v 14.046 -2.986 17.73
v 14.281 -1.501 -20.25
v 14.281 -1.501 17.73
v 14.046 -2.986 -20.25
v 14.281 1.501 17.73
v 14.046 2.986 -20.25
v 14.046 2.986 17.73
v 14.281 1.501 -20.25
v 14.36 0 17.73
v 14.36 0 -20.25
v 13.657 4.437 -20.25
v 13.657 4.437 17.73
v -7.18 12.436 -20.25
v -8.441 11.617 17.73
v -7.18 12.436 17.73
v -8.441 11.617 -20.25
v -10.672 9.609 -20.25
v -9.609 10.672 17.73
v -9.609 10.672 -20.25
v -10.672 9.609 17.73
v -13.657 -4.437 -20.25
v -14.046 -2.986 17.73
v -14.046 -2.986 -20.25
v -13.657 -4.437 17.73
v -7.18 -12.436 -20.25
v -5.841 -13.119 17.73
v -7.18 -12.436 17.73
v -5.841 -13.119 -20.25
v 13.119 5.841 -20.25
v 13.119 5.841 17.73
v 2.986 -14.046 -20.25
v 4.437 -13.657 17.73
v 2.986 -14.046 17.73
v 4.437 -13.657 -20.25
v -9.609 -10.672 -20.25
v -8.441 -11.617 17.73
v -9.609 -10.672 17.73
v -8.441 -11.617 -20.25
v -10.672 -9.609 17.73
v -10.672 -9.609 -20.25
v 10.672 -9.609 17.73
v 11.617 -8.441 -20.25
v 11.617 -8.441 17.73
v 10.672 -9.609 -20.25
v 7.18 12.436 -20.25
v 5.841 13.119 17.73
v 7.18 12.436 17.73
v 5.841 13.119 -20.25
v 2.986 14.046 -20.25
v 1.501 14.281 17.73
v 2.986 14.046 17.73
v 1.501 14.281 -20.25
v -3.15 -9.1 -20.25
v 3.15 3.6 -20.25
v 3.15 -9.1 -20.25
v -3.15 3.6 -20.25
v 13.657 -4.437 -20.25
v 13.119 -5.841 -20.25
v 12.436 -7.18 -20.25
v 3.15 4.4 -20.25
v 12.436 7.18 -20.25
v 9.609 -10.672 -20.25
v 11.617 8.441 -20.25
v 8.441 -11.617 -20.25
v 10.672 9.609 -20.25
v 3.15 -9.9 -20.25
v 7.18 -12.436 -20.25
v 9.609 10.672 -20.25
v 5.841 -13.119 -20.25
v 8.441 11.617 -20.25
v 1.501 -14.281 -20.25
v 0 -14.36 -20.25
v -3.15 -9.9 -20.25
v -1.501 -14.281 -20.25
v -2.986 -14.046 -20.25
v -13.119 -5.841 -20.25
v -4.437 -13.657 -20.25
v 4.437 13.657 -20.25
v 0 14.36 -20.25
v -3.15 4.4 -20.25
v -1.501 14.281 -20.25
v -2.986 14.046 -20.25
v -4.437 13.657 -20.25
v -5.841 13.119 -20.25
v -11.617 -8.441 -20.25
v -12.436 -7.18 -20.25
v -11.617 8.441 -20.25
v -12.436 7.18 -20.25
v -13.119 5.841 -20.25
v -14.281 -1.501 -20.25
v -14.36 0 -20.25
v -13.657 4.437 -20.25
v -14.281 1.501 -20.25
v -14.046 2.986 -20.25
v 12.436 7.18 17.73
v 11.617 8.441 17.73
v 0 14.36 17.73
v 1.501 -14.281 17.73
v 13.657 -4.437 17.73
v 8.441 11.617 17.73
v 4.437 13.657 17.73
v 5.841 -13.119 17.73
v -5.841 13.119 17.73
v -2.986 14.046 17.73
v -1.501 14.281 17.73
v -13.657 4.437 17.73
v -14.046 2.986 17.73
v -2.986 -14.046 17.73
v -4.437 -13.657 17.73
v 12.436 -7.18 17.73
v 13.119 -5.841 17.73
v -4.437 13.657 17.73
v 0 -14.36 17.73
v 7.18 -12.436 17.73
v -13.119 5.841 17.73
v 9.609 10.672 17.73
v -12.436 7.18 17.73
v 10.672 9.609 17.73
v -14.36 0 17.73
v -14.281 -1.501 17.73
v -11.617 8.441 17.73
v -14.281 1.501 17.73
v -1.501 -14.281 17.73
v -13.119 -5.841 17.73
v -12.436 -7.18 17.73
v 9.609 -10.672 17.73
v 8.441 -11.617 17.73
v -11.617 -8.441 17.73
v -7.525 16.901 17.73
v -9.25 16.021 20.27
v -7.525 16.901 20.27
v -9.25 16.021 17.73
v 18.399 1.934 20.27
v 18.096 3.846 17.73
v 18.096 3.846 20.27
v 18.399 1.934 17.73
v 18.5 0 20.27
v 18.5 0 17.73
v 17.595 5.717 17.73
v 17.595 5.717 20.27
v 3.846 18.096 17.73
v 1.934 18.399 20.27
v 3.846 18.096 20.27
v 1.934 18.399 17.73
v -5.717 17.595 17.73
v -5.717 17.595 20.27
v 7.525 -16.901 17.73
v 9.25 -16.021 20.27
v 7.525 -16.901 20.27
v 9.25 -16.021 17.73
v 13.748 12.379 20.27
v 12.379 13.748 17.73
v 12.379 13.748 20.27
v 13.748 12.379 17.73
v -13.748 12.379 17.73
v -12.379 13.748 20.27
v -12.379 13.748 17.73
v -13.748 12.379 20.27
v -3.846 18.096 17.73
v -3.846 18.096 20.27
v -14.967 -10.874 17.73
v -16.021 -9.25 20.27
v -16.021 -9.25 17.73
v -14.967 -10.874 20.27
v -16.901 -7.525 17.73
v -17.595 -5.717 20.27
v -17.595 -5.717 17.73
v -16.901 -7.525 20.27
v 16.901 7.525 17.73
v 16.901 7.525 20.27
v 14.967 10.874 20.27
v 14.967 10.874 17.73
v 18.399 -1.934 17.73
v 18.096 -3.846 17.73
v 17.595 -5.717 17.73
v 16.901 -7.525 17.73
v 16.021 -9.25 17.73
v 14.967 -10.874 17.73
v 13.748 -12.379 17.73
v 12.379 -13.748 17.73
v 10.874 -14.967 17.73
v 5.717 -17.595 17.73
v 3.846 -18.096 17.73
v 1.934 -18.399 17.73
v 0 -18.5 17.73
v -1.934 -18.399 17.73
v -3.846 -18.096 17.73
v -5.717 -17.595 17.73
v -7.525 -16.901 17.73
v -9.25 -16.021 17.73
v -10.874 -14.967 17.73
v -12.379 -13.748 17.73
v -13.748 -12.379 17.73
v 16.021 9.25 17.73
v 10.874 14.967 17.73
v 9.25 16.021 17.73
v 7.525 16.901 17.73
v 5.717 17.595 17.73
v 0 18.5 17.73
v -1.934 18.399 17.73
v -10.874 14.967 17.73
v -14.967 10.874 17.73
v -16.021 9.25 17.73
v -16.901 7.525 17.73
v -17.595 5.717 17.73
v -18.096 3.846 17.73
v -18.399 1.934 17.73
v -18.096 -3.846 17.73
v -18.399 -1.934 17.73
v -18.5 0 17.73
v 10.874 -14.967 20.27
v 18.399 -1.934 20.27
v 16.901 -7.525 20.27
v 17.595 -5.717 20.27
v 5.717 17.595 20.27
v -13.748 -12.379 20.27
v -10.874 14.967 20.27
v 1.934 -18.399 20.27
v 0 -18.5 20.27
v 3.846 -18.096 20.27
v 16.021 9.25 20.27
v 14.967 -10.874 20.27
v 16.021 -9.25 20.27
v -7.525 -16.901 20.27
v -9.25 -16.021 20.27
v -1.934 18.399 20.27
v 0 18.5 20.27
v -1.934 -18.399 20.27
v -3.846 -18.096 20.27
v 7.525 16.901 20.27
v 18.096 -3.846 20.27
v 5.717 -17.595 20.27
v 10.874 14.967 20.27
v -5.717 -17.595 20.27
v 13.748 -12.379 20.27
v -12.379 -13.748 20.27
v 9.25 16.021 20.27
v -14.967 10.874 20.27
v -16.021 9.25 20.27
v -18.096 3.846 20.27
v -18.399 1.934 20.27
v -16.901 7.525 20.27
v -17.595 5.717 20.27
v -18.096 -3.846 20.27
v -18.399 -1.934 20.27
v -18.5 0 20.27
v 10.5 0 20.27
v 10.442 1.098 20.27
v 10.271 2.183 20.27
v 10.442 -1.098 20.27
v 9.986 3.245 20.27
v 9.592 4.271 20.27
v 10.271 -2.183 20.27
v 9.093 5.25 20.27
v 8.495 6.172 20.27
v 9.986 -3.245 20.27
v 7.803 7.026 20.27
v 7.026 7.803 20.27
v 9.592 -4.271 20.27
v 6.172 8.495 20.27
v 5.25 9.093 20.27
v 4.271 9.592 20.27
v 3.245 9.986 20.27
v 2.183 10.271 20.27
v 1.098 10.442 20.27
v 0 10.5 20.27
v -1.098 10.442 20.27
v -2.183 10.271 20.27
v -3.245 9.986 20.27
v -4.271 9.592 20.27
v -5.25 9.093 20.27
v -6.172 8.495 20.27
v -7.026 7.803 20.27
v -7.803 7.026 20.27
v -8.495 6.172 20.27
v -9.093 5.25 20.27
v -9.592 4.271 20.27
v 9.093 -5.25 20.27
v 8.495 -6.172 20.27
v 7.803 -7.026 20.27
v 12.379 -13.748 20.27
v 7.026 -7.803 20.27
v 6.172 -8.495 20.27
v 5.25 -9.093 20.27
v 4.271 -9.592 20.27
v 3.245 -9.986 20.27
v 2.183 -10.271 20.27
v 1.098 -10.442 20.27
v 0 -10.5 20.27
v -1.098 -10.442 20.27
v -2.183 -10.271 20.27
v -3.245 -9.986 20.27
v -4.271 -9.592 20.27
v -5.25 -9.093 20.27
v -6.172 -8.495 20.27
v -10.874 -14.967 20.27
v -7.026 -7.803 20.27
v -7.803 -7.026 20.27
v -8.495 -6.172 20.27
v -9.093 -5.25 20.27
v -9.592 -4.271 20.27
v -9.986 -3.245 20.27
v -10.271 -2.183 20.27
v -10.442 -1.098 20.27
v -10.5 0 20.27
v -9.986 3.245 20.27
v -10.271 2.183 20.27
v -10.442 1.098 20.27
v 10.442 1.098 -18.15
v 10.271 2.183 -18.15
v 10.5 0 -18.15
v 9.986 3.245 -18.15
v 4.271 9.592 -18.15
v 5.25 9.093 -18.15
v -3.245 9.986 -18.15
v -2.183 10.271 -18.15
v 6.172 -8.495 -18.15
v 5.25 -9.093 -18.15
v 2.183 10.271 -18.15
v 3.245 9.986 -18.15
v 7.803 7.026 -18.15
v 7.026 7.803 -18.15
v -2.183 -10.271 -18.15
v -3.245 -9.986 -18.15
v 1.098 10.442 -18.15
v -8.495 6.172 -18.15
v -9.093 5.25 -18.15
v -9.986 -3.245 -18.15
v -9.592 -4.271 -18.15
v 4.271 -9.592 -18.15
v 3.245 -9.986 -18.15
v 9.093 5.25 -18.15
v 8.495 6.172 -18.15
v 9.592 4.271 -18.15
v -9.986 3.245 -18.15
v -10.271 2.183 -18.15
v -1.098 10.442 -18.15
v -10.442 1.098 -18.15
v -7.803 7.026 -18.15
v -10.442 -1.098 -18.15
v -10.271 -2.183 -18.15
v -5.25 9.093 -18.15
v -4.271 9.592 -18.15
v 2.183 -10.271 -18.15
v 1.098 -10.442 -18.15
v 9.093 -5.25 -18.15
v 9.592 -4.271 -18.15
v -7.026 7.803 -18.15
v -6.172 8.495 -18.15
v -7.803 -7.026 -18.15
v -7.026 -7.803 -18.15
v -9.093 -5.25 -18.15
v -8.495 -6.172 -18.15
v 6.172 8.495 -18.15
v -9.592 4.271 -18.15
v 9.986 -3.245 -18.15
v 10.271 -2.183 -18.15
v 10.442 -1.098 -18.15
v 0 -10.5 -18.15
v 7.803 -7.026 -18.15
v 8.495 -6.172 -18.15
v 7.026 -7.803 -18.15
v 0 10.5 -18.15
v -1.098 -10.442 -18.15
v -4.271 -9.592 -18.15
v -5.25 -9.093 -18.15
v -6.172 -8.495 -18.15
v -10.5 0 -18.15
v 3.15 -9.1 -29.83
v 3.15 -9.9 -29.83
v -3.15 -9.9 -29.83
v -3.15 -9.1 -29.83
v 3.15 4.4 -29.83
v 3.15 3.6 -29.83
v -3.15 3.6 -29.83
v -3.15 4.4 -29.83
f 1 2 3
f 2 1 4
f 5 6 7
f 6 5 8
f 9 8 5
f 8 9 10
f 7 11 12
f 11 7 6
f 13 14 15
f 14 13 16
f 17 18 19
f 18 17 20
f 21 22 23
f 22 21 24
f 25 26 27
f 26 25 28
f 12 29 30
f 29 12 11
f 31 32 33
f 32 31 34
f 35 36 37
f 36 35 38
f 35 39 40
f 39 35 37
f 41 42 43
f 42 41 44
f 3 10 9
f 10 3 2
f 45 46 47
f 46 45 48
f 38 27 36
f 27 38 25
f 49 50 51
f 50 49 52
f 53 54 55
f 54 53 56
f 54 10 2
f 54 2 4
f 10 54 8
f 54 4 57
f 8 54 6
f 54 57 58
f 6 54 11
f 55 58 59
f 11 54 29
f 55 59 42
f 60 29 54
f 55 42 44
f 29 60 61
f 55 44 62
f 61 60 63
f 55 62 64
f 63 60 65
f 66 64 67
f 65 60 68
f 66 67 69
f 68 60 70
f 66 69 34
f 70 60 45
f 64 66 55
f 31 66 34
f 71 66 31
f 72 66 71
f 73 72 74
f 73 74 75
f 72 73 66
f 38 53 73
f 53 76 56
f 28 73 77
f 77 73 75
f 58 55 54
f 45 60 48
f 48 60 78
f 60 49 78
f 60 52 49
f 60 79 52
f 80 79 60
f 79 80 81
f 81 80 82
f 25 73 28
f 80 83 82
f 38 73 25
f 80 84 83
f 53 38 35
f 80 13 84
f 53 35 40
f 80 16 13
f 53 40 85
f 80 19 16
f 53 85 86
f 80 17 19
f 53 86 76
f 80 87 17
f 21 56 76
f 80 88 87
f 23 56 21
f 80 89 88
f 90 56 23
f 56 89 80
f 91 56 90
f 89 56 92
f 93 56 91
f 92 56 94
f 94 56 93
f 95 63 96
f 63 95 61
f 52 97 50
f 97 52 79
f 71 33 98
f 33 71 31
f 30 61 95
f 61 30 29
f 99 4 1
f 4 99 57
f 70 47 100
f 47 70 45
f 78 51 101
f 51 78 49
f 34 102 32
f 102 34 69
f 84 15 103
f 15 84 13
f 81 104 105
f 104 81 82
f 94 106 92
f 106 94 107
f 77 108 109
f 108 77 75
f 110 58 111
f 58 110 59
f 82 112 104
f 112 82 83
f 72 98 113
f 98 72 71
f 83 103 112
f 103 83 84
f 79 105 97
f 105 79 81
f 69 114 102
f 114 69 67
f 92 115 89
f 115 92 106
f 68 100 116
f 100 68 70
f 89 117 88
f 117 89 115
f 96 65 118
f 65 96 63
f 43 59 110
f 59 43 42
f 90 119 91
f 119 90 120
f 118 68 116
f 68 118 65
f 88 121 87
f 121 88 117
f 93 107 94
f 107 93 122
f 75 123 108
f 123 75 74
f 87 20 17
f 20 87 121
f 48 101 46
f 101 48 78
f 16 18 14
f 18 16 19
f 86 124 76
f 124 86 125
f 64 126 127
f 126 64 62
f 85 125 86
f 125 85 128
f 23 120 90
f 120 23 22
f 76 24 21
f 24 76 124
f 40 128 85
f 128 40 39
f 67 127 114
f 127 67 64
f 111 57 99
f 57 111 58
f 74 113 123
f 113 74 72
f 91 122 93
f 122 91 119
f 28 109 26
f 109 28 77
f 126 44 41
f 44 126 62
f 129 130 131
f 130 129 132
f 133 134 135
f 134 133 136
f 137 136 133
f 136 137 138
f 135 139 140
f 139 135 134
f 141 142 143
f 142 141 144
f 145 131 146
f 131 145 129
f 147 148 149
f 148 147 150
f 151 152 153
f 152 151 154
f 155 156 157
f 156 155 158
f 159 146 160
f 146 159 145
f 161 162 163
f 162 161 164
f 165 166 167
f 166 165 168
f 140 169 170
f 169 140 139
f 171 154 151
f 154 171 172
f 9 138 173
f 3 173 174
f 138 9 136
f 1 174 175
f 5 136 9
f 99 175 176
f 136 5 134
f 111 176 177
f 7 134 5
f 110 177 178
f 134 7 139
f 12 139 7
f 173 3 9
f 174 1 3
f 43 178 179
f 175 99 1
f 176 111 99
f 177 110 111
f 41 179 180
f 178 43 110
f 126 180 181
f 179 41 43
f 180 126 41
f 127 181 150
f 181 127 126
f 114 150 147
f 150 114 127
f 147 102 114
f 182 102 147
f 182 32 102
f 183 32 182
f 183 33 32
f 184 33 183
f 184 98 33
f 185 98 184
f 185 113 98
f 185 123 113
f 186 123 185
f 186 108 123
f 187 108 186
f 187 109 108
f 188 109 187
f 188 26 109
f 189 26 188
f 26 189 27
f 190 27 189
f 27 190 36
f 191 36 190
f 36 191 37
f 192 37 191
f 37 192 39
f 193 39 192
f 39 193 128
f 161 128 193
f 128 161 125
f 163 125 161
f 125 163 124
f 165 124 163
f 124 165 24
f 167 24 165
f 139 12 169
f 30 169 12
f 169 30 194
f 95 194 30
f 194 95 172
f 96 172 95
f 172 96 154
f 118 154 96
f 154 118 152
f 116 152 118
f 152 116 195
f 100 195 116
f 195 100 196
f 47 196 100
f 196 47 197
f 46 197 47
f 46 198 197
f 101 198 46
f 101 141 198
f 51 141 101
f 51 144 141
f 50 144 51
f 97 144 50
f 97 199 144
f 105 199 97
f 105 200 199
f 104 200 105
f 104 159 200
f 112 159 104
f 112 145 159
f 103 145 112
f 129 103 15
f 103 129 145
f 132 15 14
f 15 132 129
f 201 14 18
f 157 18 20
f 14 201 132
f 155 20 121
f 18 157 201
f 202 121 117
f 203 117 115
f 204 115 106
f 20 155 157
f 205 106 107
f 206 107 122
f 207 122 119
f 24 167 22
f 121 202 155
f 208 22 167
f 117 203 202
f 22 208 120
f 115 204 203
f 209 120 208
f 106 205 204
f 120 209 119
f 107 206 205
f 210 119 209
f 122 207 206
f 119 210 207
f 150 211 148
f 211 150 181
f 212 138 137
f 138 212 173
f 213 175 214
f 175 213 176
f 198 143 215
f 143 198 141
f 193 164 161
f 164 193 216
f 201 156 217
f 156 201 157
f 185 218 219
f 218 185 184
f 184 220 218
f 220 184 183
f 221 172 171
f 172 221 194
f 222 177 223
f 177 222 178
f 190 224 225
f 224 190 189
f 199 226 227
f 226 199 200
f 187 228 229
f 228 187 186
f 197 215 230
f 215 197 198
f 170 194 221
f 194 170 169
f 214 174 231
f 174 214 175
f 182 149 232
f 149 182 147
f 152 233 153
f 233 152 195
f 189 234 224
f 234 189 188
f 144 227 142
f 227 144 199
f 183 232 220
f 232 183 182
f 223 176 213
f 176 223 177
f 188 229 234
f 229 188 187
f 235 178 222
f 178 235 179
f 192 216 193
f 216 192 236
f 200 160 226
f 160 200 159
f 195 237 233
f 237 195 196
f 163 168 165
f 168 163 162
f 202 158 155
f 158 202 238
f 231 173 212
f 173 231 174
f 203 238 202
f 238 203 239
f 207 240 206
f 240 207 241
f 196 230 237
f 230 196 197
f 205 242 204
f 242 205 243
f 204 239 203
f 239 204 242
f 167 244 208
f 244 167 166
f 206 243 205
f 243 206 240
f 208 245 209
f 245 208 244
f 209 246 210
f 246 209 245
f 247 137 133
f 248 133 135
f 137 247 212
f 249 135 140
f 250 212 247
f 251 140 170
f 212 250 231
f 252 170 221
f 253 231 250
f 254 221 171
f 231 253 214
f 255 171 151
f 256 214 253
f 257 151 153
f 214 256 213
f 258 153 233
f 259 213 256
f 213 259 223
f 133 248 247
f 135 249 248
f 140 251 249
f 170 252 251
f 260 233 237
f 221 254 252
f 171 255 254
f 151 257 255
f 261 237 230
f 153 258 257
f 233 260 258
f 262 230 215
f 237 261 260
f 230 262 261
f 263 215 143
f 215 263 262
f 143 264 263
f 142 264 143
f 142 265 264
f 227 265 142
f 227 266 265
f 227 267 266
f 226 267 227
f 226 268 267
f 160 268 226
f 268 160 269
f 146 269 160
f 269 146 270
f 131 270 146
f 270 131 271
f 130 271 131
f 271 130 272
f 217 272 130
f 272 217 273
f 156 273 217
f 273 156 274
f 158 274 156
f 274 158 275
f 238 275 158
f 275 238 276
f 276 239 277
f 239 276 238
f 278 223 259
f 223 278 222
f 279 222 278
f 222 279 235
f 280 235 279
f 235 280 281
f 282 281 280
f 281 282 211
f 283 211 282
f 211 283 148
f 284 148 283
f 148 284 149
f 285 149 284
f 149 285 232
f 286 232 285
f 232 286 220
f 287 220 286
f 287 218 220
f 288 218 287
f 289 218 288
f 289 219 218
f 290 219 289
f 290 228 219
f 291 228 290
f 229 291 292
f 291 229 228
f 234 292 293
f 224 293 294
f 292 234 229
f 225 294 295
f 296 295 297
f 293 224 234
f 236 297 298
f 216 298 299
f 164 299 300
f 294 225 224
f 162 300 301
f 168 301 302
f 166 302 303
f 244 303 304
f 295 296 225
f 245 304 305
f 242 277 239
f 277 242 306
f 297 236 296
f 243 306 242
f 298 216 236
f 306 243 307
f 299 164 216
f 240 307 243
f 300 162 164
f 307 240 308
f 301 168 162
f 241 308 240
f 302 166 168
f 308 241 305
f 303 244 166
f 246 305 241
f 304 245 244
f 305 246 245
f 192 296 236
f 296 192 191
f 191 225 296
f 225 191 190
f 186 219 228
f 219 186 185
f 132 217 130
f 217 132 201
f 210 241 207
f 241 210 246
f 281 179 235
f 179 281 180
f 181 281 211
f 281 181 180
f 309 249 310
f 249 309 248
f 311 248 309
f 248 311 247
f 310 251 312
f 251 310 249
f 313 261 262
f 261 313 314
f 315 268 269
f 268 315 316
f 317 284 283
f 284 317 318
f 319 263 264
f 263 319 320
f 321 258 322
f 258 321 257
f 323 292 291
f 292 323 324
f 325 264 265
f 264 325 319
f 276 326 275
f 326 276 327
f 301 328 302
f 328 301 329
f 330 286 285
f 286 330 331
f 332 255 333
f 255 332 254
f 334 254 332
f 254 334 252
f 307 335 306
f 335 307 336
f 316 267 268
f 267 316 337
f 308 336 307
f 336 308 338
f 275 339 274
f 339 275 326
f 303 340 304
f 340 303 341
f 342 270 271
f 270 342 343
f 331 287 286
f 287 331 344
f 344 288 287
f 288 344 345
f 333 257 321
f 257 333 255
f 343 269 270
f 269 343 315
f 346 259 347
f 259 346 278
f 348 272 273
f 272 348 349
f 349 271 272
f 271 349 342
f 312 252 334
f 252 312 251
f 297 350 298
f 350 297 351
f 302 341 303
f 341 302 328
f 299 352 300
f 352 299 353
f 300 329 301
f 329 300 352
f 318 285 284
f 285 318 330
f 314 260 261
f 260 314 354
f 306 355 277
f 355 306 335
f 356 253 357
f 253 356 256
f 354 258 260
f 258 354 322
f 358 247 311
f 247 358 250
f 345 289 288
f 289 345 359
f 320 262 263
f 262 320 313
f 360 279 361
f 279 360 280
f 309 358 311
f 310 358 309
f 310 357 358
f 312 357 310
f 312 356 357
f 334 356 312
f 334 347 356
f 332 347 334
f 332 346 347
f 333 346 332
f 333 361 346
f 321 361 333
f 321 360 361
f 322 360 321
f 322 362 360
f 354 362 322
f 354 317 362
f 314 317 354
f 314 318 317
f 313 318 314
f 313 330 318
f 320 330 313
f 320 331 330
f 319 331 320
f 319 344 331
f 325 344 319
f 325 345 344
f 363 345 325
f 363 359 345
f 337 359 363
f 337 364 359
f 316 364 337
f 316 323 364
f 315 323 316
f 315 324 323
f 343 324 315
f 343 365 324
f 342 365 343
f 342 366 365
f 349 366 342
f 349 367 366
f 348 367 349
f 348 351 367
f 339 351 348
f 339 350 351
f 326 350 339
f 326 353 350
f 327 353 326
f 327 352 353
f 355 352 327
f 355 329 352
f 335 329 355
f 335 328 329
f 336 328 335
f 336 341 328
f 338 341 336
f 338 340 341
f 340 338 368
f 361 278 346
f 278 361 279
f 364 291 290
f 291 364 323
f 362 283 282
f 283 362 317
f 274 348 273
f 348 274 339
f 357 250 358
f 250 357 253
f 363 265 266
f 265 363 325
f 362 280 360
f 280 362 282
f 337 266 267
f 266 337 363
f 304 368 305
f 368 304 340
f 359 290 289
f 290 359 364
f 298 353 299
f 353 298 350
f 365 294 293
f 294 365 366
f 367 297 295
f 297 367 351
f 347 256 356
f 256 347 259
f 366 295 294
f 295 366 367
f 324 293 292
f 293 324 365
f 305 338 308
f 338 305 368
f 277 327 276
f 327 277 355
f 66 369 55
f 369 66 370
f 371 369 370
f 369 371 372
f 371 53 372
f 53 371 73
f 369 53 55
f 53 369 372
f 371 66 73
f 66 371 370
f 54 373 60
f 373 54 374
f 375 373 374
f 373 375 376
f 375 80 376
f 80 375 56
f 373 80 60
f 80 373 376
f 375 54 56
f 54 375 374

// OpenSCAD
$fn=60;


module kfz() {
    color("#808080") difference() {
        union() {
            cylinder(h=40.5, d=28.72, center=true);
            translate([0,0,19]) cylinder(h=2.54, d=37, center=true);
        }
        translate([0,0,1.1]) cylinder(h=38.5, d=21, center=true);
    }
            
    color("lightgray") translate([0,-9.5,-25]) cube([6.3, 0.8, 9.66], center=true);
    color("lightgray") translate([0,+4,-25]) cube([6.3, 0.8, 9.66], center=true);
}

kfz();
